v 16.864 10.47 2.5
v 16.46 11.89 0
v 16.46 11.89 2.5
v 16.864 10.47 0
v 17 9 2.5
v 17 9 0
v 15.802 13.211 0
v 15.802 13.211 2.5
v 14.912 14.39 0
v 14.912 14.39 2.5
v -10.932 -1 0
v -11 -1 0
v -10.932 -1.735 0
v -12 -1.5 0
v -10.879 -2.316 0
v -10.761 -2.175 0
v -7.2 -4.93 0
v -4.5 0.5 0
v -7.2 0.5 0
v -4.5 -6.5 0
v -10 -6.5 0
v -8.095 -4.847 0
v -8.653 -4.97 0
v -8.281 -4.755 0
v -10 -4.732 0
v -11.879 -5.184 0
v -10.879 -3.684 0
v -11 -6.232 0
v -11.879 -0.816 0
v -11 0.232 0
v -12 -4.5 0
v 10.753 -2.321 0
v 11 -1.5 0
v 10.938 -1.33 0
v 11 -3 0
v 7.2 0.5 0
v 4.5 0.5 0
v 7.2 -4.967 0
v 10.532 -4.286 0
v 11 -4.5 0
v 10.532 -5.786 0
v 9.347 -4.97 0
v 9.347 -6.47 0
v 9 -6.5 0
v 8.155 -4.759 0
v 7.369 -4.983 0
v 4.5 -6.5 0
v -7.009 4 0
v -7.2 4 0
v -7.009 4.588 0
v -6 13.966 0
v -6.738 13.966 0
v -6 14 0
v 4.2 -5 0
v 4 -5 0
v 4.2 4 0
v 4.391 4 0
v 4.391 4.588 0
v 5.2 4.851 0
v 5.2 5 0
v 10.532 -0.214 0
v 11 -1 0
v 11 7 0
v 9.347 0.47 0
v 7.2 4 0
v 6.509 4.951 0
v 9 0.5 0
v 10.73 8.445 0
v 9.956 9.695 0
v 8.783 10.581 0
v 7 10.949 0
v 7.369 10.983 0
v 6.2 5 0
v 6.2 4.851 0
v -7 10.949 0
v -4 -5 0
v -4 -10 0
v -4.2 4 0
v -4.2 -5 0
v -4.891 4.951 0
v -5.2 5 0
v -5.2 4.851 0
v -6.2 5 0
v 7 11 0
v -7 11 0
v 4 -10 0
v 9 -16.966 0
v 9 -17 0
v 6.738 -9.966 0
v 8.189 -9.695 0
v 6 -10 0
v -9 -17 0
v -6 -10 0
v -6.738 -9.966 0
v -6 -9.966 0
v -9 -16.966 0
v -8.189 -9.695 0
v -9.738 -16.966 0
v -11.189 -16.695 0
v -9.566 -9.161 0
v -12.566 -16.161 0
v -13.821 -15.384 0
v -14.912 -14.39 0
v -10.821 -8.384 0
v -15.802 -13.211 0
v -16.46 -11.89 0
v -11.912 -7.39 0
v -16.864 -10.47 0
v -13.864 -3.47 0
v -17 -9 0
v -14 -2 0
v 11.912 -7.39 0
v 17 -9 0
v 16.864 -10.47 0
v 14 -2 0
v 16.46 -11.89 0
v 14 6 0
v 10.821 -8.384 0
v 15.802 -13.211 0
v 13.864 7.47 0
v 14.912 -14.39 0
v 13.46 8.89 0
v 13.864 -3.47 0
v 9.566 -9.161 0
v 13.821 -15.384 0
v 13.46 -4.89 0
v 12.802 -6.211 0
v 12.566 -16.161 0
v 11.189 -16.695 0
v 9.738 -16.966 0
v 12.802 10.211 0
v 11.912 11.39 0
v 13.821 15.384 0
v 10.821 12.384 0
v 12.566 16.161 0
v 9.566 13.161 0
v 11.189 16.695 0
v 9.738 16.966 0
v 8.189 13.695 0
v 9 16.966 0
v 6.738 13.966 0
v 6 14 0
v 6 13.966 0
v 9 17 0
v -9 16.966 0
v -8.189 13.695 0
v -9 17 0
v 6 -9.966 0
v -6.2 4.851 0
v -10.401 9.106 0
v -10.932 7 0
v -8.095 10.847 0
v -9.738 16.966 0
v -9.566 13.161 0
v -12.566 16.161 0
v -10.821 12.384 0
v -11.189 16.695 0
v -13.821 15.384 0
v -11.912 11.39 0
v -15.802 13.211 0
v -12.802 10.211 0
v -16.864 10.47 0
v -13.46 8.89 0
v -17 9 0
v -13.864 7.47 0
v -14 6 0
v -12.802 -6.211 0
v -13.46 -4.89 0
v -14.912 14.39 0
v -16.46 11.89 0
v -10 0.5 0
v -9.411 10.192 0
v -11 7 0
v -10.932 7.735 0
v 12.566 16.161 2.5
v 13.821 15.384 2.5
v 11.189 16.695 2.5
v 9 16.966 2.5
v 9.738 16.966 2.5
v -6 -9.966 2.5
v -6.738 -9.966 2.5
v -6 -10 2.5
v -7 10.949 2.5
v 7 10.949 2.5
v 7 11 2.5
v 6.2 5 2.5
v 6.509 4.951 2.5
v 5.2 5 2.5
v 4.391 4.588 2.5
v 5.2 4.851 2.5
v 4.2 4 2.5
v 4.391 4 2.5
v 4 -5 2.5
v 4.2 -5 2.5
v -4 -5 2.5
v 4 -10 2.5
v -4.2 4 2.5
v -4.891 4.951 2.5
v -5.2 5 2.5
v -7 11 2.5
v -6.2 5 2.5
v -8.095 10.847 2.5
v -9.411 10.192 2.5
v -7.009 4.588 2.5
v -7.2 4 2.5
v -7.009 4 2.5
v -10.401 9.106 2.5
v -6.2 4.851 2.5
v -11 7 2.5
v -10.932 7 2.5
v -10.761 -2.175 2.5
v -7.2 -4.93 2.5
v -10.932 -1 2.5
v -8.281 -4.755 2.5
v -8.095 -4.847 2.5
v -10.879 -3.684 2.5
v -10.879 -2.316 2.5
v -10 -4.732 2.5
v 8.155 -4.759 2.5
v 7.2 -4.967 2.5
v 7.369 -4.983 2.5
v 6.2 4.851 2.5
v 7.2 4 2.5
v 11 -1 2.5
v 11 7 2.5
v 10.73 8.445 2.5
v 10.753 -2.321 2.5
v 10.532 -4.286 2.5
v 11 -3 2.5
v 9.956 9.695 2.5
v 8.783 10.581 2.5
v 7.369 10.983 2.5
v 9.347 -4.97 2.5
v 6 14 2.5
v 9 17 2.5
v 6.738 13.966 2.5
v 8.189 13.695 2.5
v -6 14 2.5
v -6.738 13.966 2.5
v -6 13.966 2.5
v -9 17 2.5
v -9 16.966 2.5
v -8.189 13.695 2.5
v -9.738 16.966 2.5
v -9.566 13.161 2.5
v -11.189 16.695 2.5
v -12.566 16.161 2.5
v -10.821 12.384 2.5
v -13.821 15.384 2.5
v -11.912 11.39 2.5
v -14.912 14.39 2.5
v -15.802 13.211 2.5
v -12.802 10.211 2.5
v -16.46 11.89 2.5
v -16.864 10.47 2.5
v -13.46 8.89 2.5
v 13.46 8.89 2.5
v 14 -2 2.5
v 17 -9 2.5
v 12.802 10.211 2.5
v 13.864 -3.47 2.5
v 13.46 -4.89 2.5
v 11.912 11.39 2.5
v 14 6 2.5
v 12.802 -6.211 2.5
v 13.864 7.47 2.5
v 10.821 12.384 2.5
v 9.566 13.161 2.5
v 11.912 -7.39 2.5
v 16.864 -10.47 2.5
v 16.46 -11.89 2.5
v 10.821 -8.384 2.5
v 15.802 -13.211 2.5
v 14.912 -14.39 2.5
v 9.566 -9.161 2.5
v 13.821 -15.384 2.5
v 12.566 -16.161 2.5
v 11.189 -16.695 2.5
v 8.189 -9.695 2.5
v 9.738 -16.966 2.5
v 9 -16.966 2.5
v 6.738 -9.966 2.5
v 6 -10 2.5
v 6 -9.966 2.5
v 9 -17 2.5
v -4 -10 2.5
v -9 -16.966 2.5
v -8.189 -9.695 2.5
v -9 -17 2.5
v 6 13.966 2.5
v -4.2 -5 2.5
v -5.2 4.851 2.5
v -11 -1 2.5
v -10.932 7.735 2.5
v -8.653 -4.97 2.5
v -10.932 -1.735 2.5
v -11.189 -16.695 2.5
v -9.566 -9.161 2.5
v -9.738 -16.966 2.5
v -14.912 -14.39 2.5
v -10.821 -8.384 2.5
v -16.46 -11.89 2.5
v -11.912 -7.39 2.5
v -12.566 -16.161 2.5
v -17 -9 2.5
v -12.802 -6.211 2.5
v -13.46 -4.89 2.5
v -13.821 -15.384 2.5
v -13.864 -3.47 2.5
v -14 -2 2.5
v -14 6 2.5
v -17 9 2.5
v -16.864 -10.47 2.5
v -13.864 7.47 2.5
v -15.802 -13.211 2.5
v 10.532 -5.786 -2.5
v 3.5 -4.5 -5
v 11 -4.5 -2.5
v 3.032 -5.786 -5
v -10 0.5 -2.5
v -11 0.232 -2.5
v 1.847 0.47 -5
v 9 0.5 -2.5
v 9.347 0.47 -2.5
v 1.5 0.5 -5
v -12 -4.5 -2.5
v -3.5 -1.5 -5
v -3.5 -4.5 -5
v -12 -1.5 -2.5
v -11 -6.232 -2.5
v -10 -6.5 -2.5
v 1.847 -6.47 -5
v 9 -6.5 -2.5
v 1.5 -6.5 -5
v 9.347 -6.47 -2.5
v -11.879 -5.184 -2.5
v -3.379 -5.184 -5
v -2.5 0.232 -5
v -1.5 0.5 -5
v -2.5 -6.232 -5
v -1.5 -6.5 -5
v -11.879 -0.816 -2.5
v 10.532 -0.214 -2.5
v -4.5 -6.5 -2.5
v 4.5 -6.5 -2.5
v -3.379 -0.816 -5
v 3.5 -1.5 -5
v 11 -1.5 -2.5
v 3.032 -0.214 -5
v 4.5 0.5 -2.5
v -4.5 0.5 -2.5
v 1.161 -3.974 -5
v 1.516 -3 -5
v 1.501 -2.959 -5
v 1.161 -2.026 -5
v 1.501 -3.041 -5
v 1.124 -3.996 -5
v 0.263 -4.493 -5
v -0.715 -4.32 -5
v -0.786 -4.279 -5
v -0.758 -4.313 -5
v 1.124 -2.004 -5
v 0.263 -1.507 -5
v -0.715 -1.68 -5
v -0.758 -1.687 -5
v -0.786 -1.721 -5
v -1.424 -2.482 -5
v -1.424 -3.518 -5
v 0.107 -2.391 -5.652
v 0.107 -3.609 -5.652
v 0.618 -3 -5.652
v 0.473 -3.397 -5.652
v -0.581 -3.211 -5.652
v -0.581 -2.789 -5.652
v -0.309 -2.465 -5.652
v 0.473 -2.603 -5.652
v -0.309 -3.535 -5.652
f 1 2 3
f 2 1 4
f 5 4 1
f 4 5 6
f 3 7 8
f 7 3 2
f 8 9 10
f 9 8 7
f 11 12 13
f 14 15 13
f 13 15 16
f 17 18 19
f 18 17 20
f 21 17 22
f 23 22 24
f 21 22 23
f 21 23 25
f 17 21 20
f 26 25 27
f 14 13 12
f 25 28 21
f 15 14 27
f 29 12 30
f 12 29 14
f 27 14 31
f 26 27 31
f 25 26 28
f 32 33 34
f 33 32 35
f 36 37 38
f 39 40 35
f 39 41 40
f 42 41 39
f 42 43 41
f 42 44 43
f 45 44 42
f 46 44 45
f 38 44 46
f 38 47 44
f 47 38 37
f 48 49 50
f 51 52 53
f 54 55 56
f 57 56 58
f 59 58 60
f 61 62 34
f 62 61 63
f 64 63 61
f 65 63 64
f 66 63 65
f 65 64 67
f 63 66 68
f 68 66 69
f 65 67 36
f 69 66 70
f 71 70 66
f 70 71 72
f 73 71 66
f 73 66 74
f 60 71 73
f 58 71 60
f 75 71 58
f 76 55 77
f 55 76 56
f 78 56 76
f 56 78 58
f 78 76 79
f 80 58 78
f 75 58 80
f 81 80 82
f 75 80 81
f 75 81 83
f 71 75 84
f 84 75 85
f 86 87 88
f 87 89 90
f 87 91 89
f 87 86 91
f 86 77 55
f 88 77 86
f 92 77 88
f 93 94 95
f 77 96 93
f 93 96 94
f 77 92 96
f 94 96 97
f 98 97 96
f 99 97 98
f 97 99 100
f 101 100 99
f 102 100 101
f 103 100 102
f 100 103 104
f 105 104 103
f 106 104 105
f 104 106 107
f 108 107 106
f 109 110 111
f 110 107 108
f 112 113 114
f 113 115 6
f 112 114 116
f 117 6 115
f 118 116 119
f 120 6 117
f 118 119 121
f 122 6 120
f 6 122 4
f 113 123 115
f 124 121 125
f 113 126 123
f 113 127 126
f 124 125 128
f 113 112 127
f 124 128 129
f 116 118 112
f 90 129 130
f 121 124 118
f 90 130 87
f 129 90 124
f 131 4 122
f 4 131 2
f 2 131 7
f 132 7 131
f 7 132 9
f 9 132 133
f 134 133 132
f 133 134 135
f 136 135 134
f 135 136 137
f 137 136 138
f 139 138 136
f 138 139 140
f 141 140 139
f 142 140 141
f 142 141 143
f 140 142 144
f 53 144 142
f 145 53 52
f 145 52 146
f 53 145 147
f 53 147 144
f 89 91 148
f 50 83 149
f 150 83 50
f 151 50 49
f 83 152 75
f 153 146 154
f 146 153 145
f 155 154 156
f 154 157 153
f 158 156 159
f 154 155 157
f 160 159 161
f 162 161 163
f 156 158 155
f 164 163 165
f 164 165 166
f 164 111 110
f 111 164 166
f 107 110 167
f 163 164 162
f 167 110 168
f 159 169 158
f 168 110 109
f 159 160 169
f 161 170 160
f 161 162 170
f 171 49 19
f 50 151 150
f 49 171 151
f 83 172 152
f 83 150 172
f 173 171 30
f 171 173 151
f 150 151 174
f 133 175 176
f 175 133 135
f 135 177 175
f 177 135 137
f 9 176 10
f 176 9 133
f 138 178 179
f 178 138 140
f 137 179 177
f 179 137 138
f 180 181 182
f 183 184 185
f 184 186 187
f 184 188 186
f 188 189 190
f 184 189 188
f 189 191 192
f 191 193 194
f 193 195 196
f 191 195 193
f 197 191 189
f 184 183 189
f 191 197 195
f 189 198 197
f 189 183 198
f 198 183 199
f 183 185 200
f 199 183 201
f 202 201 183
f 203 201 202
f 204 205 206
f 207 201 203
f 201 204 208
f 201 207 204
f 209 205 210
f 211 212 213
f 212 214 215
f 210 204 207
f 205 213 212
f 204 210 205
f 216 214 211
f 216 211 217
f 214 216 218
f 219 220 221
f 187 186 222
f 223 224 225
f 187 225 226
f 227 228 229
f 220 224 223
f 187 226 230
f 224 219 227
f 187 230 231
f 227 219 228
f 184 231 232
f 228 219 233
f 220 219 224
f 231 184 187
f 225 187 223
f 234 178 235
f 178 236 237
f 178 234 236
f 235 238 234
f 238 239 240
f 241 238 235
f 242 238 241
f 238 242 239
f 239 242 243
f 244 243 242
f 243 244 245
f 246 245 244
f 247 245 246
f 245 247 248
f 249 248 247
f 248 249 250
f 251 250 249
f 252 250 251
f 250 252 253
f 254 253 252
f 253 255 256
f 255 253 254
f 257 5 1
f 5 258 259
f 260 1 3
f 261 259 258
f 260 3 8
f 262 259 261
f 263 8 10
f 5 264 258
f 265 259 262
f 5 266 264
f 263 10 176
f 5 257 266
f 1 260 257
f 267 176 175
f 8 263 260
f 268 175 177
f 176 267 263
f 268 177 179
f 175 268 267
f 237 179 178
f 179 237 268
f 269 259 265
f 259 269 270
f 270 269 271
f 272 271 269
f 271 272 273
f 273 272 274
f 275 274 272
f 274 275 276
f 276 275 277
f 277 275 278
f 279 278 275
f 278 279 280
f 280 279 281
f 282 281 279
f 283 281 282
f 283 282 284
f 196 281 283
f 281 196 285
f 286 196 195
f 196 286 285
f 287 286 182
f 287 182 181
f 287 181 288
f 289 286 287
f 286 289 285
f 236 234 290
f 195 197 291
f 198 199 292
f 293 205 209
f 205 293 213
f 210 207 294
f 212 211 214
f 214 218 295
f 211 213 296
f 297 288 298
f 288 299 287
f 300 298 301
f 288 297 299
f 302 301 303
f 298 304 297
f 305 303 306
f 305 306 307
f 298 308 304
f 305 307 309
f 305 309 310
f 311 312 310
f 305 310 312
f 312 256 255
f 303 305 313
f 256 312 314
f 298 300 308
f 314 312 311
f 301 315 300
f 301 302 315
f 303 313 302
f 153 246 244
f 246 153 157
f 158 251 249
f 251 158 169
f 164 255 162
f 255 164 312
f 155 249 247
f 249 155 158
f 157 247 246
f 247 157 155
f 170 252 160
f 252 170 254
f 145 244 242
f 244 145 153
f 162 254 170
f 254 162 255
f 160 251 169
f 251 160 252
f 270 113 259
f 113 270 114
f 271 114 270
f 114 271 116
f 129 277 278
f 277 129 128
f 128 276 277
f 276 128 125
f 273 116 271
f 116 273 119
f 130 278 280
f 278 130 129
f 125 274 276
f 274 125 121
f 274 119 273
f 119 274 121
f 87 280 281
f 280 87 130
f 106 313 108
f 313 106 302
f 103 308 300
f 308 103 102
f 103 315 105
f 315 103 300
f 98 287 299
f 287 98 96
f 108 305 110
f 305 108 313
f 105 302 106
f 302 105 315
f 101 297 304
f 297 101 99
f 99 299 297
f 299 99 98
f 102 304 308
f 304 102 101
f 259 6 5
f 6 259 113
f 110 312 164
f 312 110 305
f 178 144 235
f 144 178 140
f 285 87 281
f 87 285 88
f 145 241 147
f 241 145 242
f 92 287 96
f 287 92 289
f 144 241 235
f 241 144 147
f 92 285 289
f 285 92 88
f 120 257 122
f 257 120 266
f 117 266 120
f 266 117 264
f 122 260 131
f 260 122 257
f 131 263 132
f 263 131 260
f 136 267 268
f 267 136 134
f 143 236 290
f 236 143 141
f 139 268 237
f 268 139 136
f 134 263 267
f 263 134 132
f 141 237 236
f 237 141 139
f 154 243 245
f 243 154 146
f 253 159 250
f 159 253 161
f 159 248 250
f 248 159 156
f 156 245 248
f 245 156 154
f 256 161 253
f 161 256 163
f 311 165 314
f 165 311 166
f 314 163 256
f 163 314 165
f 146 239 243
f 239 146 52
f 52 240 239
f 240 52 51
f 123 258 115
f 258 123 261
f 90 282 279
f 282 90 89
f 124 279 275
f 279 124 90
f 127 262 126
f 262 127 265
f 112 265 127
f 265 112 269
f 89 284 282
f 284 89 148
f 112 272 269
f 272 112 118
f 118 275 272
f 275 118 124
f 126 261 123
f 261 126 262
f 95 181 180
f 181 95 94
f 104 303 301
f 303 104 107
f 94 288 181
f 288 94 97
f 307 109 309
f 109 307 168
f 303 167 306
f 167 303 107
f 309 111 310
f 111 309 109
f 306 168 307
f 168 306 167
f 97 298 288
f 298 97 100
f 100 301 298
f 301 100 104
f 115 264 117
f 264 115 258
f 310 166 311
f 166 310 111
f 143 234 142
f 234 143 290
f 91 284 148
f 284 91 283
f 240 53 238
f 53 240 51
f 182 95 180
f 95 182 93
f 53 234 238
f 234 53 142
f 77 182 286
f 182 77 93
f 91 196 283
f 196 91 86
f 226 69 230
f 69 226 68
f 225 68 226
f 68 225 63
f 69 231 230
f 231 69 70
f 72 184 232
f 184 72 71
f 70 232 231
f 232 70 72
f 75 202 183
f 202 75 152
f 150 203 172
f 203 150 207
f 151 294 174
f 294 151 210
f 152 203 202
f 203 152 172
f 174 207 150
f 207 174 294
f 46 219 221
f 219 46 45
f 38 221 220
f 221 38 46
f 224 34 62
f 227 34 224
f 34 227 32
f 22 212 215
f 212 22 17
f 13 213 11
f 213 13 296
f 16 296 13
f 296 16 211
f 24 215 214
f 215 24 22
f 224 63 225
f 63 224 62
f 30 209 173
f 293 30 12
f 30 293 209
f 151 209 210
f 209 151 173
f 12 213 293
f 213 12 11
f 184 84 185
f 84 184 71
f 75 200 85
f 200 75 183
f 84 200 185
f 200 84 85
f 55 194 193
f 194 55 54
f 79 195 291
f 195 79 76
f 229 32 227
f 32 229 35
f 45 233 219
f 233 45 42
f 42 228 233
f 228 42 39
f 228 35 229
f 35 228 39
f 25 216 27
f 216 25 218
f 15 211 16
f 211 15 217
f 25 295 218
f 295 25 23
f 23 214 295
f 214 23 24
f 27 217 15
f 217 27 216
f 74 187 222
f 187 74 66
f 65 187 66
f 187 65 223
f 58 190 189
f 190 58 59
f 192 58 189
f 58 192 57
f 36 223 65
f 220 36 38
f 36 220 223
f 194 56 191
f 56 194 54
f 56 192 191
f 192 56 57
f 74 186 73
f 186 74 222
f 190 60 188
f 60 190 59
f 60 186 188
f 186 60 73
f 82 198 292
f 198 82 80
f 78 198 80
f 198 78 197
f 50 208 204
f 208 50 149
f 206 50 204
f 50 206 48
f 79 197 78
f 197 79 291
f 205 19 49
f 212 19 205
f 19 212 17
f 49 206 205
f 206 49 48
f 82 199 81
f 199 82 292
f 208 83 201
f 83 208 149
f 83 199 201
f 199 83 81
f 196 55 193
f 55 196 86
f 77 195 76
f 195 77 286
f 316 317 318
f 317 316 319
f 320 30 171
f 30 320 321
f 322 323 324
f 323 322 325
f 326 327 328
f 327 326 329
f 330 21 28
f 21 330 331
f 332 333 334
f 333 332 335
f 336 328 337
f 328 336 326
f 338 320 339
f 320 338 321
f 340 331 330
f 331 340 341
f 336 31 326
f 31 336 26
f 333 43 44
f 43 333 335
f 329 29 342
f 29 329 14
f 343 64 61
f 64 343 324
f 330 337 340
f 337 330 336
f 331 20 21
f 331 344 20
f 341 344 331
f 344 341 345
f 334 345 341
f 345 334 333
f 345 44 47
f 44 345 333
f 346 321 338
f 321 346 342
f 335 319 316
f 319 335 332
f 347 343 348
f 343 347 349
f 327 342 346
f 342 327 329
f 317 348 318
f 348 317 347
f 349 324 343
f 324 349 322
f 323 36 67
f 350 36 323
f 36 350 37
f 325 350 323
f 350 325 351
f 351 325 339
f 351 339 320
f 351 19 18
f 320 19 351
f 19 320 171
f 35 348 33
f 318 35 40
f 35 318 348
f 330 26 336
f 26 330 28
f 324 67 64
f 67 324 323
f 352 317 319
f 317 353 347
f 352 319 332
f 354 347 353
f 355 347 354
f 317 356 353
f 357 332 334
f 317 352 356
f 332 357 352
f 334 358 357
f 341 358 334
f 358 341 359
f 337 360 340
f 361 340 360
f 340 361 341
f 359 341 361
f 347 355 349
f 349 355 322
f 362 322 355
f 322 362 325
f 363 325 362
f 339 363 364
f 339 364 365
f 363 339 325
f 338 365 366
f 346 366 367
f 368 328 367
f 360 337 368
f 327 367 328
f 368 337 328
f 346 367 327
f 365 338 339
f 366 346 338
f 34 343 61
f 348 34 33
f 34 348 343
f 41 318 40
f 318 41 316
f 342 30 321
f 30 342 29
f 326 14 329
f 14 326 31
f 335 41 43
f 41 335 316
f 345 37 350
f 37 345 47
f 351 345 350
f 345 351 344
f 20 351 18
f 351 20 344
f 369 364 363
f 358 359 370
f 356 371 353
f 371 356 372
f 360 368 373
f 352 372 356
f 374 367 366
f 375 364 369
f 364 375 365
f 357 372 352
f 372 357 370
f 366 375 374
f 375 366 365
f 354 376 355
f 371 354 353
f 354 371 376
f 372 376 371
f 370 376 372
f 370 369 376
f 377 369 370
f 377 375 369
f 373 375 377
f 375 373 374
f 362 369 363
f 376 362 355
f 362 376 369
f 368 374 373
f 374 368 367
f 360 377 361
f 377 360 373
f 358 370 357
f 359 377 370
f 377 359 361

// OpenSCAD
// Fine detail
//$fa = 0.5;
//$fs = 0.5;

// Coarse detail
$fa = 1.0;
$fs = 1.5;

sensor_width = 34;
sensor_thick = 2.5;
sensor_corner_radius = 8;

edge_width = 3;      // width of 3 sides
top_width = 7;     // width of 4 side

tongue_width = 8; // width of tongue running to U shape (also bottom of U)

u_total_width =  22; // width of outsides of U shape
u_height = 16;       // height of U shape
u_y_offset = 3;      // vertical offset of U shape
u_bar_width = 4;     // width of vertical bars of U shape
u_radius = 4;        // radius @ top of vertical bars of U shape

module rounded_square(x, y, z, corner_radius) {
  union()
  {
    radius_offset_x = x / 2 - corner_radius;
    radius_offset_y = y / 2 - corner_radius;

    // 4 corners from circles
    translate([radius_offset_x,radius_offset_y,0])           cylinder(r=corner_radius, h=z);
    translate([-1 * radius_offset_x,radius_offset_y,0])      cylinder(r=corner_radius, h=z);
    translate([radius_offset_x,-1 * radius_offset_y,0])      cylinder(r=corner_radius, h=z);
    translate([-1 * radius_offset_x,-1 *radius_offset_y,0])  cylinder(r=corner_radius, h=z);

    // fill in the middle with bars
    translate([0,0,(z/2)])  cube([x,2*radius_offset_y,z],center=true);
    translate([0,0,(z/2)])  cube([2*radius_offset_x, y,z],center=true);
  }
}

color([0.7,0.7,0.7])union()
{
    //edge ring
    difference()
    {
        rounded_square(sensor_width, sensor_width, sensor_thick, sensor_corner_radius);
    
        hole_x = sensor_width - 2 * edge_width;
        hole_y = sensor_width - edge_width - top_width;
        fudge_z = 1; // used to make subtractive area a little thicker
    
        translate([0,(top_width-edge_width)/2,fudge_z/-2]) rounded_square(hole_x, hole_y, sensor_thick+fudge_z , sensor_corner_radius);
    }
    
    // toungue
    offset_from_bottom = u_height + u_y_offset + edge_width;
    translate([0,-1*(sensor_width - offset_from_bottom)/2, sensor_thick/2]) cube([tongue_width, sensor_width - offset_from_bottom, sensor_thick], center=true);
    
    // U Shape
    difference()
    {
        union()
        {
            translate([0,(edge_width)]) rounded_square(u_total_width, u_height, sensor_thick , sensor_corner_radius/2);
            translate([9,-edge_width,0]) cylinder(r=2.0, h=sensor_thick);
            translate([-9,-edge_width,0]) cylinder(r=2.0, h=sensor_thick);
        }
        // just harcode these holes
        translate([5.7,-edge_width,-0.5]) rounded_square(3, 16, sensor_thick+1 , 1);
        translate([-5.7,-(edge_width),-0.5]) rounded_square(3, 16, sensor_thick+1 , 1);
    }
}

color([0.7,0.7,0.7]) union()
{
    difference()
    {
        hull()
        {
       
            translate([-9,-edge_width,0]) difference()
            {
                translate([0,0,-sensor_thick]) rounded_square(6, 7, sensor_thick , 2);
                translate([3.7,0,sensor_thick/-2]) cube([3, 7, sensor_thick+1] , center=true);
            }
            translate([8,-edge_width,0]) difference()
            {
                translate([0,0,-sensor_thick]) rounded_square(6, 7, sensor_thick , 2);
                translate([-2.5,0,sensor_thick/-2]) cube([3, 7, sensor_thick+1] , center=true);
            }
            translate([0,-edge_width,-2*sensor_thick]) rounded_square(7, 7, sensor_thick , 2);
        }
        translate([0,-edge_width,-0.5*sensor_thick]) cube([9,9,sensor_thick], center=true);
    }
    difference()
    {
        translate([0,-edge_width,-1.5*sensor_thick]) sphere(r=2, h=3);
        translate([0,-edge_width,-0.5*sensor_thick]) cube([9,9,sensor_thick], center=true);
    }
}
